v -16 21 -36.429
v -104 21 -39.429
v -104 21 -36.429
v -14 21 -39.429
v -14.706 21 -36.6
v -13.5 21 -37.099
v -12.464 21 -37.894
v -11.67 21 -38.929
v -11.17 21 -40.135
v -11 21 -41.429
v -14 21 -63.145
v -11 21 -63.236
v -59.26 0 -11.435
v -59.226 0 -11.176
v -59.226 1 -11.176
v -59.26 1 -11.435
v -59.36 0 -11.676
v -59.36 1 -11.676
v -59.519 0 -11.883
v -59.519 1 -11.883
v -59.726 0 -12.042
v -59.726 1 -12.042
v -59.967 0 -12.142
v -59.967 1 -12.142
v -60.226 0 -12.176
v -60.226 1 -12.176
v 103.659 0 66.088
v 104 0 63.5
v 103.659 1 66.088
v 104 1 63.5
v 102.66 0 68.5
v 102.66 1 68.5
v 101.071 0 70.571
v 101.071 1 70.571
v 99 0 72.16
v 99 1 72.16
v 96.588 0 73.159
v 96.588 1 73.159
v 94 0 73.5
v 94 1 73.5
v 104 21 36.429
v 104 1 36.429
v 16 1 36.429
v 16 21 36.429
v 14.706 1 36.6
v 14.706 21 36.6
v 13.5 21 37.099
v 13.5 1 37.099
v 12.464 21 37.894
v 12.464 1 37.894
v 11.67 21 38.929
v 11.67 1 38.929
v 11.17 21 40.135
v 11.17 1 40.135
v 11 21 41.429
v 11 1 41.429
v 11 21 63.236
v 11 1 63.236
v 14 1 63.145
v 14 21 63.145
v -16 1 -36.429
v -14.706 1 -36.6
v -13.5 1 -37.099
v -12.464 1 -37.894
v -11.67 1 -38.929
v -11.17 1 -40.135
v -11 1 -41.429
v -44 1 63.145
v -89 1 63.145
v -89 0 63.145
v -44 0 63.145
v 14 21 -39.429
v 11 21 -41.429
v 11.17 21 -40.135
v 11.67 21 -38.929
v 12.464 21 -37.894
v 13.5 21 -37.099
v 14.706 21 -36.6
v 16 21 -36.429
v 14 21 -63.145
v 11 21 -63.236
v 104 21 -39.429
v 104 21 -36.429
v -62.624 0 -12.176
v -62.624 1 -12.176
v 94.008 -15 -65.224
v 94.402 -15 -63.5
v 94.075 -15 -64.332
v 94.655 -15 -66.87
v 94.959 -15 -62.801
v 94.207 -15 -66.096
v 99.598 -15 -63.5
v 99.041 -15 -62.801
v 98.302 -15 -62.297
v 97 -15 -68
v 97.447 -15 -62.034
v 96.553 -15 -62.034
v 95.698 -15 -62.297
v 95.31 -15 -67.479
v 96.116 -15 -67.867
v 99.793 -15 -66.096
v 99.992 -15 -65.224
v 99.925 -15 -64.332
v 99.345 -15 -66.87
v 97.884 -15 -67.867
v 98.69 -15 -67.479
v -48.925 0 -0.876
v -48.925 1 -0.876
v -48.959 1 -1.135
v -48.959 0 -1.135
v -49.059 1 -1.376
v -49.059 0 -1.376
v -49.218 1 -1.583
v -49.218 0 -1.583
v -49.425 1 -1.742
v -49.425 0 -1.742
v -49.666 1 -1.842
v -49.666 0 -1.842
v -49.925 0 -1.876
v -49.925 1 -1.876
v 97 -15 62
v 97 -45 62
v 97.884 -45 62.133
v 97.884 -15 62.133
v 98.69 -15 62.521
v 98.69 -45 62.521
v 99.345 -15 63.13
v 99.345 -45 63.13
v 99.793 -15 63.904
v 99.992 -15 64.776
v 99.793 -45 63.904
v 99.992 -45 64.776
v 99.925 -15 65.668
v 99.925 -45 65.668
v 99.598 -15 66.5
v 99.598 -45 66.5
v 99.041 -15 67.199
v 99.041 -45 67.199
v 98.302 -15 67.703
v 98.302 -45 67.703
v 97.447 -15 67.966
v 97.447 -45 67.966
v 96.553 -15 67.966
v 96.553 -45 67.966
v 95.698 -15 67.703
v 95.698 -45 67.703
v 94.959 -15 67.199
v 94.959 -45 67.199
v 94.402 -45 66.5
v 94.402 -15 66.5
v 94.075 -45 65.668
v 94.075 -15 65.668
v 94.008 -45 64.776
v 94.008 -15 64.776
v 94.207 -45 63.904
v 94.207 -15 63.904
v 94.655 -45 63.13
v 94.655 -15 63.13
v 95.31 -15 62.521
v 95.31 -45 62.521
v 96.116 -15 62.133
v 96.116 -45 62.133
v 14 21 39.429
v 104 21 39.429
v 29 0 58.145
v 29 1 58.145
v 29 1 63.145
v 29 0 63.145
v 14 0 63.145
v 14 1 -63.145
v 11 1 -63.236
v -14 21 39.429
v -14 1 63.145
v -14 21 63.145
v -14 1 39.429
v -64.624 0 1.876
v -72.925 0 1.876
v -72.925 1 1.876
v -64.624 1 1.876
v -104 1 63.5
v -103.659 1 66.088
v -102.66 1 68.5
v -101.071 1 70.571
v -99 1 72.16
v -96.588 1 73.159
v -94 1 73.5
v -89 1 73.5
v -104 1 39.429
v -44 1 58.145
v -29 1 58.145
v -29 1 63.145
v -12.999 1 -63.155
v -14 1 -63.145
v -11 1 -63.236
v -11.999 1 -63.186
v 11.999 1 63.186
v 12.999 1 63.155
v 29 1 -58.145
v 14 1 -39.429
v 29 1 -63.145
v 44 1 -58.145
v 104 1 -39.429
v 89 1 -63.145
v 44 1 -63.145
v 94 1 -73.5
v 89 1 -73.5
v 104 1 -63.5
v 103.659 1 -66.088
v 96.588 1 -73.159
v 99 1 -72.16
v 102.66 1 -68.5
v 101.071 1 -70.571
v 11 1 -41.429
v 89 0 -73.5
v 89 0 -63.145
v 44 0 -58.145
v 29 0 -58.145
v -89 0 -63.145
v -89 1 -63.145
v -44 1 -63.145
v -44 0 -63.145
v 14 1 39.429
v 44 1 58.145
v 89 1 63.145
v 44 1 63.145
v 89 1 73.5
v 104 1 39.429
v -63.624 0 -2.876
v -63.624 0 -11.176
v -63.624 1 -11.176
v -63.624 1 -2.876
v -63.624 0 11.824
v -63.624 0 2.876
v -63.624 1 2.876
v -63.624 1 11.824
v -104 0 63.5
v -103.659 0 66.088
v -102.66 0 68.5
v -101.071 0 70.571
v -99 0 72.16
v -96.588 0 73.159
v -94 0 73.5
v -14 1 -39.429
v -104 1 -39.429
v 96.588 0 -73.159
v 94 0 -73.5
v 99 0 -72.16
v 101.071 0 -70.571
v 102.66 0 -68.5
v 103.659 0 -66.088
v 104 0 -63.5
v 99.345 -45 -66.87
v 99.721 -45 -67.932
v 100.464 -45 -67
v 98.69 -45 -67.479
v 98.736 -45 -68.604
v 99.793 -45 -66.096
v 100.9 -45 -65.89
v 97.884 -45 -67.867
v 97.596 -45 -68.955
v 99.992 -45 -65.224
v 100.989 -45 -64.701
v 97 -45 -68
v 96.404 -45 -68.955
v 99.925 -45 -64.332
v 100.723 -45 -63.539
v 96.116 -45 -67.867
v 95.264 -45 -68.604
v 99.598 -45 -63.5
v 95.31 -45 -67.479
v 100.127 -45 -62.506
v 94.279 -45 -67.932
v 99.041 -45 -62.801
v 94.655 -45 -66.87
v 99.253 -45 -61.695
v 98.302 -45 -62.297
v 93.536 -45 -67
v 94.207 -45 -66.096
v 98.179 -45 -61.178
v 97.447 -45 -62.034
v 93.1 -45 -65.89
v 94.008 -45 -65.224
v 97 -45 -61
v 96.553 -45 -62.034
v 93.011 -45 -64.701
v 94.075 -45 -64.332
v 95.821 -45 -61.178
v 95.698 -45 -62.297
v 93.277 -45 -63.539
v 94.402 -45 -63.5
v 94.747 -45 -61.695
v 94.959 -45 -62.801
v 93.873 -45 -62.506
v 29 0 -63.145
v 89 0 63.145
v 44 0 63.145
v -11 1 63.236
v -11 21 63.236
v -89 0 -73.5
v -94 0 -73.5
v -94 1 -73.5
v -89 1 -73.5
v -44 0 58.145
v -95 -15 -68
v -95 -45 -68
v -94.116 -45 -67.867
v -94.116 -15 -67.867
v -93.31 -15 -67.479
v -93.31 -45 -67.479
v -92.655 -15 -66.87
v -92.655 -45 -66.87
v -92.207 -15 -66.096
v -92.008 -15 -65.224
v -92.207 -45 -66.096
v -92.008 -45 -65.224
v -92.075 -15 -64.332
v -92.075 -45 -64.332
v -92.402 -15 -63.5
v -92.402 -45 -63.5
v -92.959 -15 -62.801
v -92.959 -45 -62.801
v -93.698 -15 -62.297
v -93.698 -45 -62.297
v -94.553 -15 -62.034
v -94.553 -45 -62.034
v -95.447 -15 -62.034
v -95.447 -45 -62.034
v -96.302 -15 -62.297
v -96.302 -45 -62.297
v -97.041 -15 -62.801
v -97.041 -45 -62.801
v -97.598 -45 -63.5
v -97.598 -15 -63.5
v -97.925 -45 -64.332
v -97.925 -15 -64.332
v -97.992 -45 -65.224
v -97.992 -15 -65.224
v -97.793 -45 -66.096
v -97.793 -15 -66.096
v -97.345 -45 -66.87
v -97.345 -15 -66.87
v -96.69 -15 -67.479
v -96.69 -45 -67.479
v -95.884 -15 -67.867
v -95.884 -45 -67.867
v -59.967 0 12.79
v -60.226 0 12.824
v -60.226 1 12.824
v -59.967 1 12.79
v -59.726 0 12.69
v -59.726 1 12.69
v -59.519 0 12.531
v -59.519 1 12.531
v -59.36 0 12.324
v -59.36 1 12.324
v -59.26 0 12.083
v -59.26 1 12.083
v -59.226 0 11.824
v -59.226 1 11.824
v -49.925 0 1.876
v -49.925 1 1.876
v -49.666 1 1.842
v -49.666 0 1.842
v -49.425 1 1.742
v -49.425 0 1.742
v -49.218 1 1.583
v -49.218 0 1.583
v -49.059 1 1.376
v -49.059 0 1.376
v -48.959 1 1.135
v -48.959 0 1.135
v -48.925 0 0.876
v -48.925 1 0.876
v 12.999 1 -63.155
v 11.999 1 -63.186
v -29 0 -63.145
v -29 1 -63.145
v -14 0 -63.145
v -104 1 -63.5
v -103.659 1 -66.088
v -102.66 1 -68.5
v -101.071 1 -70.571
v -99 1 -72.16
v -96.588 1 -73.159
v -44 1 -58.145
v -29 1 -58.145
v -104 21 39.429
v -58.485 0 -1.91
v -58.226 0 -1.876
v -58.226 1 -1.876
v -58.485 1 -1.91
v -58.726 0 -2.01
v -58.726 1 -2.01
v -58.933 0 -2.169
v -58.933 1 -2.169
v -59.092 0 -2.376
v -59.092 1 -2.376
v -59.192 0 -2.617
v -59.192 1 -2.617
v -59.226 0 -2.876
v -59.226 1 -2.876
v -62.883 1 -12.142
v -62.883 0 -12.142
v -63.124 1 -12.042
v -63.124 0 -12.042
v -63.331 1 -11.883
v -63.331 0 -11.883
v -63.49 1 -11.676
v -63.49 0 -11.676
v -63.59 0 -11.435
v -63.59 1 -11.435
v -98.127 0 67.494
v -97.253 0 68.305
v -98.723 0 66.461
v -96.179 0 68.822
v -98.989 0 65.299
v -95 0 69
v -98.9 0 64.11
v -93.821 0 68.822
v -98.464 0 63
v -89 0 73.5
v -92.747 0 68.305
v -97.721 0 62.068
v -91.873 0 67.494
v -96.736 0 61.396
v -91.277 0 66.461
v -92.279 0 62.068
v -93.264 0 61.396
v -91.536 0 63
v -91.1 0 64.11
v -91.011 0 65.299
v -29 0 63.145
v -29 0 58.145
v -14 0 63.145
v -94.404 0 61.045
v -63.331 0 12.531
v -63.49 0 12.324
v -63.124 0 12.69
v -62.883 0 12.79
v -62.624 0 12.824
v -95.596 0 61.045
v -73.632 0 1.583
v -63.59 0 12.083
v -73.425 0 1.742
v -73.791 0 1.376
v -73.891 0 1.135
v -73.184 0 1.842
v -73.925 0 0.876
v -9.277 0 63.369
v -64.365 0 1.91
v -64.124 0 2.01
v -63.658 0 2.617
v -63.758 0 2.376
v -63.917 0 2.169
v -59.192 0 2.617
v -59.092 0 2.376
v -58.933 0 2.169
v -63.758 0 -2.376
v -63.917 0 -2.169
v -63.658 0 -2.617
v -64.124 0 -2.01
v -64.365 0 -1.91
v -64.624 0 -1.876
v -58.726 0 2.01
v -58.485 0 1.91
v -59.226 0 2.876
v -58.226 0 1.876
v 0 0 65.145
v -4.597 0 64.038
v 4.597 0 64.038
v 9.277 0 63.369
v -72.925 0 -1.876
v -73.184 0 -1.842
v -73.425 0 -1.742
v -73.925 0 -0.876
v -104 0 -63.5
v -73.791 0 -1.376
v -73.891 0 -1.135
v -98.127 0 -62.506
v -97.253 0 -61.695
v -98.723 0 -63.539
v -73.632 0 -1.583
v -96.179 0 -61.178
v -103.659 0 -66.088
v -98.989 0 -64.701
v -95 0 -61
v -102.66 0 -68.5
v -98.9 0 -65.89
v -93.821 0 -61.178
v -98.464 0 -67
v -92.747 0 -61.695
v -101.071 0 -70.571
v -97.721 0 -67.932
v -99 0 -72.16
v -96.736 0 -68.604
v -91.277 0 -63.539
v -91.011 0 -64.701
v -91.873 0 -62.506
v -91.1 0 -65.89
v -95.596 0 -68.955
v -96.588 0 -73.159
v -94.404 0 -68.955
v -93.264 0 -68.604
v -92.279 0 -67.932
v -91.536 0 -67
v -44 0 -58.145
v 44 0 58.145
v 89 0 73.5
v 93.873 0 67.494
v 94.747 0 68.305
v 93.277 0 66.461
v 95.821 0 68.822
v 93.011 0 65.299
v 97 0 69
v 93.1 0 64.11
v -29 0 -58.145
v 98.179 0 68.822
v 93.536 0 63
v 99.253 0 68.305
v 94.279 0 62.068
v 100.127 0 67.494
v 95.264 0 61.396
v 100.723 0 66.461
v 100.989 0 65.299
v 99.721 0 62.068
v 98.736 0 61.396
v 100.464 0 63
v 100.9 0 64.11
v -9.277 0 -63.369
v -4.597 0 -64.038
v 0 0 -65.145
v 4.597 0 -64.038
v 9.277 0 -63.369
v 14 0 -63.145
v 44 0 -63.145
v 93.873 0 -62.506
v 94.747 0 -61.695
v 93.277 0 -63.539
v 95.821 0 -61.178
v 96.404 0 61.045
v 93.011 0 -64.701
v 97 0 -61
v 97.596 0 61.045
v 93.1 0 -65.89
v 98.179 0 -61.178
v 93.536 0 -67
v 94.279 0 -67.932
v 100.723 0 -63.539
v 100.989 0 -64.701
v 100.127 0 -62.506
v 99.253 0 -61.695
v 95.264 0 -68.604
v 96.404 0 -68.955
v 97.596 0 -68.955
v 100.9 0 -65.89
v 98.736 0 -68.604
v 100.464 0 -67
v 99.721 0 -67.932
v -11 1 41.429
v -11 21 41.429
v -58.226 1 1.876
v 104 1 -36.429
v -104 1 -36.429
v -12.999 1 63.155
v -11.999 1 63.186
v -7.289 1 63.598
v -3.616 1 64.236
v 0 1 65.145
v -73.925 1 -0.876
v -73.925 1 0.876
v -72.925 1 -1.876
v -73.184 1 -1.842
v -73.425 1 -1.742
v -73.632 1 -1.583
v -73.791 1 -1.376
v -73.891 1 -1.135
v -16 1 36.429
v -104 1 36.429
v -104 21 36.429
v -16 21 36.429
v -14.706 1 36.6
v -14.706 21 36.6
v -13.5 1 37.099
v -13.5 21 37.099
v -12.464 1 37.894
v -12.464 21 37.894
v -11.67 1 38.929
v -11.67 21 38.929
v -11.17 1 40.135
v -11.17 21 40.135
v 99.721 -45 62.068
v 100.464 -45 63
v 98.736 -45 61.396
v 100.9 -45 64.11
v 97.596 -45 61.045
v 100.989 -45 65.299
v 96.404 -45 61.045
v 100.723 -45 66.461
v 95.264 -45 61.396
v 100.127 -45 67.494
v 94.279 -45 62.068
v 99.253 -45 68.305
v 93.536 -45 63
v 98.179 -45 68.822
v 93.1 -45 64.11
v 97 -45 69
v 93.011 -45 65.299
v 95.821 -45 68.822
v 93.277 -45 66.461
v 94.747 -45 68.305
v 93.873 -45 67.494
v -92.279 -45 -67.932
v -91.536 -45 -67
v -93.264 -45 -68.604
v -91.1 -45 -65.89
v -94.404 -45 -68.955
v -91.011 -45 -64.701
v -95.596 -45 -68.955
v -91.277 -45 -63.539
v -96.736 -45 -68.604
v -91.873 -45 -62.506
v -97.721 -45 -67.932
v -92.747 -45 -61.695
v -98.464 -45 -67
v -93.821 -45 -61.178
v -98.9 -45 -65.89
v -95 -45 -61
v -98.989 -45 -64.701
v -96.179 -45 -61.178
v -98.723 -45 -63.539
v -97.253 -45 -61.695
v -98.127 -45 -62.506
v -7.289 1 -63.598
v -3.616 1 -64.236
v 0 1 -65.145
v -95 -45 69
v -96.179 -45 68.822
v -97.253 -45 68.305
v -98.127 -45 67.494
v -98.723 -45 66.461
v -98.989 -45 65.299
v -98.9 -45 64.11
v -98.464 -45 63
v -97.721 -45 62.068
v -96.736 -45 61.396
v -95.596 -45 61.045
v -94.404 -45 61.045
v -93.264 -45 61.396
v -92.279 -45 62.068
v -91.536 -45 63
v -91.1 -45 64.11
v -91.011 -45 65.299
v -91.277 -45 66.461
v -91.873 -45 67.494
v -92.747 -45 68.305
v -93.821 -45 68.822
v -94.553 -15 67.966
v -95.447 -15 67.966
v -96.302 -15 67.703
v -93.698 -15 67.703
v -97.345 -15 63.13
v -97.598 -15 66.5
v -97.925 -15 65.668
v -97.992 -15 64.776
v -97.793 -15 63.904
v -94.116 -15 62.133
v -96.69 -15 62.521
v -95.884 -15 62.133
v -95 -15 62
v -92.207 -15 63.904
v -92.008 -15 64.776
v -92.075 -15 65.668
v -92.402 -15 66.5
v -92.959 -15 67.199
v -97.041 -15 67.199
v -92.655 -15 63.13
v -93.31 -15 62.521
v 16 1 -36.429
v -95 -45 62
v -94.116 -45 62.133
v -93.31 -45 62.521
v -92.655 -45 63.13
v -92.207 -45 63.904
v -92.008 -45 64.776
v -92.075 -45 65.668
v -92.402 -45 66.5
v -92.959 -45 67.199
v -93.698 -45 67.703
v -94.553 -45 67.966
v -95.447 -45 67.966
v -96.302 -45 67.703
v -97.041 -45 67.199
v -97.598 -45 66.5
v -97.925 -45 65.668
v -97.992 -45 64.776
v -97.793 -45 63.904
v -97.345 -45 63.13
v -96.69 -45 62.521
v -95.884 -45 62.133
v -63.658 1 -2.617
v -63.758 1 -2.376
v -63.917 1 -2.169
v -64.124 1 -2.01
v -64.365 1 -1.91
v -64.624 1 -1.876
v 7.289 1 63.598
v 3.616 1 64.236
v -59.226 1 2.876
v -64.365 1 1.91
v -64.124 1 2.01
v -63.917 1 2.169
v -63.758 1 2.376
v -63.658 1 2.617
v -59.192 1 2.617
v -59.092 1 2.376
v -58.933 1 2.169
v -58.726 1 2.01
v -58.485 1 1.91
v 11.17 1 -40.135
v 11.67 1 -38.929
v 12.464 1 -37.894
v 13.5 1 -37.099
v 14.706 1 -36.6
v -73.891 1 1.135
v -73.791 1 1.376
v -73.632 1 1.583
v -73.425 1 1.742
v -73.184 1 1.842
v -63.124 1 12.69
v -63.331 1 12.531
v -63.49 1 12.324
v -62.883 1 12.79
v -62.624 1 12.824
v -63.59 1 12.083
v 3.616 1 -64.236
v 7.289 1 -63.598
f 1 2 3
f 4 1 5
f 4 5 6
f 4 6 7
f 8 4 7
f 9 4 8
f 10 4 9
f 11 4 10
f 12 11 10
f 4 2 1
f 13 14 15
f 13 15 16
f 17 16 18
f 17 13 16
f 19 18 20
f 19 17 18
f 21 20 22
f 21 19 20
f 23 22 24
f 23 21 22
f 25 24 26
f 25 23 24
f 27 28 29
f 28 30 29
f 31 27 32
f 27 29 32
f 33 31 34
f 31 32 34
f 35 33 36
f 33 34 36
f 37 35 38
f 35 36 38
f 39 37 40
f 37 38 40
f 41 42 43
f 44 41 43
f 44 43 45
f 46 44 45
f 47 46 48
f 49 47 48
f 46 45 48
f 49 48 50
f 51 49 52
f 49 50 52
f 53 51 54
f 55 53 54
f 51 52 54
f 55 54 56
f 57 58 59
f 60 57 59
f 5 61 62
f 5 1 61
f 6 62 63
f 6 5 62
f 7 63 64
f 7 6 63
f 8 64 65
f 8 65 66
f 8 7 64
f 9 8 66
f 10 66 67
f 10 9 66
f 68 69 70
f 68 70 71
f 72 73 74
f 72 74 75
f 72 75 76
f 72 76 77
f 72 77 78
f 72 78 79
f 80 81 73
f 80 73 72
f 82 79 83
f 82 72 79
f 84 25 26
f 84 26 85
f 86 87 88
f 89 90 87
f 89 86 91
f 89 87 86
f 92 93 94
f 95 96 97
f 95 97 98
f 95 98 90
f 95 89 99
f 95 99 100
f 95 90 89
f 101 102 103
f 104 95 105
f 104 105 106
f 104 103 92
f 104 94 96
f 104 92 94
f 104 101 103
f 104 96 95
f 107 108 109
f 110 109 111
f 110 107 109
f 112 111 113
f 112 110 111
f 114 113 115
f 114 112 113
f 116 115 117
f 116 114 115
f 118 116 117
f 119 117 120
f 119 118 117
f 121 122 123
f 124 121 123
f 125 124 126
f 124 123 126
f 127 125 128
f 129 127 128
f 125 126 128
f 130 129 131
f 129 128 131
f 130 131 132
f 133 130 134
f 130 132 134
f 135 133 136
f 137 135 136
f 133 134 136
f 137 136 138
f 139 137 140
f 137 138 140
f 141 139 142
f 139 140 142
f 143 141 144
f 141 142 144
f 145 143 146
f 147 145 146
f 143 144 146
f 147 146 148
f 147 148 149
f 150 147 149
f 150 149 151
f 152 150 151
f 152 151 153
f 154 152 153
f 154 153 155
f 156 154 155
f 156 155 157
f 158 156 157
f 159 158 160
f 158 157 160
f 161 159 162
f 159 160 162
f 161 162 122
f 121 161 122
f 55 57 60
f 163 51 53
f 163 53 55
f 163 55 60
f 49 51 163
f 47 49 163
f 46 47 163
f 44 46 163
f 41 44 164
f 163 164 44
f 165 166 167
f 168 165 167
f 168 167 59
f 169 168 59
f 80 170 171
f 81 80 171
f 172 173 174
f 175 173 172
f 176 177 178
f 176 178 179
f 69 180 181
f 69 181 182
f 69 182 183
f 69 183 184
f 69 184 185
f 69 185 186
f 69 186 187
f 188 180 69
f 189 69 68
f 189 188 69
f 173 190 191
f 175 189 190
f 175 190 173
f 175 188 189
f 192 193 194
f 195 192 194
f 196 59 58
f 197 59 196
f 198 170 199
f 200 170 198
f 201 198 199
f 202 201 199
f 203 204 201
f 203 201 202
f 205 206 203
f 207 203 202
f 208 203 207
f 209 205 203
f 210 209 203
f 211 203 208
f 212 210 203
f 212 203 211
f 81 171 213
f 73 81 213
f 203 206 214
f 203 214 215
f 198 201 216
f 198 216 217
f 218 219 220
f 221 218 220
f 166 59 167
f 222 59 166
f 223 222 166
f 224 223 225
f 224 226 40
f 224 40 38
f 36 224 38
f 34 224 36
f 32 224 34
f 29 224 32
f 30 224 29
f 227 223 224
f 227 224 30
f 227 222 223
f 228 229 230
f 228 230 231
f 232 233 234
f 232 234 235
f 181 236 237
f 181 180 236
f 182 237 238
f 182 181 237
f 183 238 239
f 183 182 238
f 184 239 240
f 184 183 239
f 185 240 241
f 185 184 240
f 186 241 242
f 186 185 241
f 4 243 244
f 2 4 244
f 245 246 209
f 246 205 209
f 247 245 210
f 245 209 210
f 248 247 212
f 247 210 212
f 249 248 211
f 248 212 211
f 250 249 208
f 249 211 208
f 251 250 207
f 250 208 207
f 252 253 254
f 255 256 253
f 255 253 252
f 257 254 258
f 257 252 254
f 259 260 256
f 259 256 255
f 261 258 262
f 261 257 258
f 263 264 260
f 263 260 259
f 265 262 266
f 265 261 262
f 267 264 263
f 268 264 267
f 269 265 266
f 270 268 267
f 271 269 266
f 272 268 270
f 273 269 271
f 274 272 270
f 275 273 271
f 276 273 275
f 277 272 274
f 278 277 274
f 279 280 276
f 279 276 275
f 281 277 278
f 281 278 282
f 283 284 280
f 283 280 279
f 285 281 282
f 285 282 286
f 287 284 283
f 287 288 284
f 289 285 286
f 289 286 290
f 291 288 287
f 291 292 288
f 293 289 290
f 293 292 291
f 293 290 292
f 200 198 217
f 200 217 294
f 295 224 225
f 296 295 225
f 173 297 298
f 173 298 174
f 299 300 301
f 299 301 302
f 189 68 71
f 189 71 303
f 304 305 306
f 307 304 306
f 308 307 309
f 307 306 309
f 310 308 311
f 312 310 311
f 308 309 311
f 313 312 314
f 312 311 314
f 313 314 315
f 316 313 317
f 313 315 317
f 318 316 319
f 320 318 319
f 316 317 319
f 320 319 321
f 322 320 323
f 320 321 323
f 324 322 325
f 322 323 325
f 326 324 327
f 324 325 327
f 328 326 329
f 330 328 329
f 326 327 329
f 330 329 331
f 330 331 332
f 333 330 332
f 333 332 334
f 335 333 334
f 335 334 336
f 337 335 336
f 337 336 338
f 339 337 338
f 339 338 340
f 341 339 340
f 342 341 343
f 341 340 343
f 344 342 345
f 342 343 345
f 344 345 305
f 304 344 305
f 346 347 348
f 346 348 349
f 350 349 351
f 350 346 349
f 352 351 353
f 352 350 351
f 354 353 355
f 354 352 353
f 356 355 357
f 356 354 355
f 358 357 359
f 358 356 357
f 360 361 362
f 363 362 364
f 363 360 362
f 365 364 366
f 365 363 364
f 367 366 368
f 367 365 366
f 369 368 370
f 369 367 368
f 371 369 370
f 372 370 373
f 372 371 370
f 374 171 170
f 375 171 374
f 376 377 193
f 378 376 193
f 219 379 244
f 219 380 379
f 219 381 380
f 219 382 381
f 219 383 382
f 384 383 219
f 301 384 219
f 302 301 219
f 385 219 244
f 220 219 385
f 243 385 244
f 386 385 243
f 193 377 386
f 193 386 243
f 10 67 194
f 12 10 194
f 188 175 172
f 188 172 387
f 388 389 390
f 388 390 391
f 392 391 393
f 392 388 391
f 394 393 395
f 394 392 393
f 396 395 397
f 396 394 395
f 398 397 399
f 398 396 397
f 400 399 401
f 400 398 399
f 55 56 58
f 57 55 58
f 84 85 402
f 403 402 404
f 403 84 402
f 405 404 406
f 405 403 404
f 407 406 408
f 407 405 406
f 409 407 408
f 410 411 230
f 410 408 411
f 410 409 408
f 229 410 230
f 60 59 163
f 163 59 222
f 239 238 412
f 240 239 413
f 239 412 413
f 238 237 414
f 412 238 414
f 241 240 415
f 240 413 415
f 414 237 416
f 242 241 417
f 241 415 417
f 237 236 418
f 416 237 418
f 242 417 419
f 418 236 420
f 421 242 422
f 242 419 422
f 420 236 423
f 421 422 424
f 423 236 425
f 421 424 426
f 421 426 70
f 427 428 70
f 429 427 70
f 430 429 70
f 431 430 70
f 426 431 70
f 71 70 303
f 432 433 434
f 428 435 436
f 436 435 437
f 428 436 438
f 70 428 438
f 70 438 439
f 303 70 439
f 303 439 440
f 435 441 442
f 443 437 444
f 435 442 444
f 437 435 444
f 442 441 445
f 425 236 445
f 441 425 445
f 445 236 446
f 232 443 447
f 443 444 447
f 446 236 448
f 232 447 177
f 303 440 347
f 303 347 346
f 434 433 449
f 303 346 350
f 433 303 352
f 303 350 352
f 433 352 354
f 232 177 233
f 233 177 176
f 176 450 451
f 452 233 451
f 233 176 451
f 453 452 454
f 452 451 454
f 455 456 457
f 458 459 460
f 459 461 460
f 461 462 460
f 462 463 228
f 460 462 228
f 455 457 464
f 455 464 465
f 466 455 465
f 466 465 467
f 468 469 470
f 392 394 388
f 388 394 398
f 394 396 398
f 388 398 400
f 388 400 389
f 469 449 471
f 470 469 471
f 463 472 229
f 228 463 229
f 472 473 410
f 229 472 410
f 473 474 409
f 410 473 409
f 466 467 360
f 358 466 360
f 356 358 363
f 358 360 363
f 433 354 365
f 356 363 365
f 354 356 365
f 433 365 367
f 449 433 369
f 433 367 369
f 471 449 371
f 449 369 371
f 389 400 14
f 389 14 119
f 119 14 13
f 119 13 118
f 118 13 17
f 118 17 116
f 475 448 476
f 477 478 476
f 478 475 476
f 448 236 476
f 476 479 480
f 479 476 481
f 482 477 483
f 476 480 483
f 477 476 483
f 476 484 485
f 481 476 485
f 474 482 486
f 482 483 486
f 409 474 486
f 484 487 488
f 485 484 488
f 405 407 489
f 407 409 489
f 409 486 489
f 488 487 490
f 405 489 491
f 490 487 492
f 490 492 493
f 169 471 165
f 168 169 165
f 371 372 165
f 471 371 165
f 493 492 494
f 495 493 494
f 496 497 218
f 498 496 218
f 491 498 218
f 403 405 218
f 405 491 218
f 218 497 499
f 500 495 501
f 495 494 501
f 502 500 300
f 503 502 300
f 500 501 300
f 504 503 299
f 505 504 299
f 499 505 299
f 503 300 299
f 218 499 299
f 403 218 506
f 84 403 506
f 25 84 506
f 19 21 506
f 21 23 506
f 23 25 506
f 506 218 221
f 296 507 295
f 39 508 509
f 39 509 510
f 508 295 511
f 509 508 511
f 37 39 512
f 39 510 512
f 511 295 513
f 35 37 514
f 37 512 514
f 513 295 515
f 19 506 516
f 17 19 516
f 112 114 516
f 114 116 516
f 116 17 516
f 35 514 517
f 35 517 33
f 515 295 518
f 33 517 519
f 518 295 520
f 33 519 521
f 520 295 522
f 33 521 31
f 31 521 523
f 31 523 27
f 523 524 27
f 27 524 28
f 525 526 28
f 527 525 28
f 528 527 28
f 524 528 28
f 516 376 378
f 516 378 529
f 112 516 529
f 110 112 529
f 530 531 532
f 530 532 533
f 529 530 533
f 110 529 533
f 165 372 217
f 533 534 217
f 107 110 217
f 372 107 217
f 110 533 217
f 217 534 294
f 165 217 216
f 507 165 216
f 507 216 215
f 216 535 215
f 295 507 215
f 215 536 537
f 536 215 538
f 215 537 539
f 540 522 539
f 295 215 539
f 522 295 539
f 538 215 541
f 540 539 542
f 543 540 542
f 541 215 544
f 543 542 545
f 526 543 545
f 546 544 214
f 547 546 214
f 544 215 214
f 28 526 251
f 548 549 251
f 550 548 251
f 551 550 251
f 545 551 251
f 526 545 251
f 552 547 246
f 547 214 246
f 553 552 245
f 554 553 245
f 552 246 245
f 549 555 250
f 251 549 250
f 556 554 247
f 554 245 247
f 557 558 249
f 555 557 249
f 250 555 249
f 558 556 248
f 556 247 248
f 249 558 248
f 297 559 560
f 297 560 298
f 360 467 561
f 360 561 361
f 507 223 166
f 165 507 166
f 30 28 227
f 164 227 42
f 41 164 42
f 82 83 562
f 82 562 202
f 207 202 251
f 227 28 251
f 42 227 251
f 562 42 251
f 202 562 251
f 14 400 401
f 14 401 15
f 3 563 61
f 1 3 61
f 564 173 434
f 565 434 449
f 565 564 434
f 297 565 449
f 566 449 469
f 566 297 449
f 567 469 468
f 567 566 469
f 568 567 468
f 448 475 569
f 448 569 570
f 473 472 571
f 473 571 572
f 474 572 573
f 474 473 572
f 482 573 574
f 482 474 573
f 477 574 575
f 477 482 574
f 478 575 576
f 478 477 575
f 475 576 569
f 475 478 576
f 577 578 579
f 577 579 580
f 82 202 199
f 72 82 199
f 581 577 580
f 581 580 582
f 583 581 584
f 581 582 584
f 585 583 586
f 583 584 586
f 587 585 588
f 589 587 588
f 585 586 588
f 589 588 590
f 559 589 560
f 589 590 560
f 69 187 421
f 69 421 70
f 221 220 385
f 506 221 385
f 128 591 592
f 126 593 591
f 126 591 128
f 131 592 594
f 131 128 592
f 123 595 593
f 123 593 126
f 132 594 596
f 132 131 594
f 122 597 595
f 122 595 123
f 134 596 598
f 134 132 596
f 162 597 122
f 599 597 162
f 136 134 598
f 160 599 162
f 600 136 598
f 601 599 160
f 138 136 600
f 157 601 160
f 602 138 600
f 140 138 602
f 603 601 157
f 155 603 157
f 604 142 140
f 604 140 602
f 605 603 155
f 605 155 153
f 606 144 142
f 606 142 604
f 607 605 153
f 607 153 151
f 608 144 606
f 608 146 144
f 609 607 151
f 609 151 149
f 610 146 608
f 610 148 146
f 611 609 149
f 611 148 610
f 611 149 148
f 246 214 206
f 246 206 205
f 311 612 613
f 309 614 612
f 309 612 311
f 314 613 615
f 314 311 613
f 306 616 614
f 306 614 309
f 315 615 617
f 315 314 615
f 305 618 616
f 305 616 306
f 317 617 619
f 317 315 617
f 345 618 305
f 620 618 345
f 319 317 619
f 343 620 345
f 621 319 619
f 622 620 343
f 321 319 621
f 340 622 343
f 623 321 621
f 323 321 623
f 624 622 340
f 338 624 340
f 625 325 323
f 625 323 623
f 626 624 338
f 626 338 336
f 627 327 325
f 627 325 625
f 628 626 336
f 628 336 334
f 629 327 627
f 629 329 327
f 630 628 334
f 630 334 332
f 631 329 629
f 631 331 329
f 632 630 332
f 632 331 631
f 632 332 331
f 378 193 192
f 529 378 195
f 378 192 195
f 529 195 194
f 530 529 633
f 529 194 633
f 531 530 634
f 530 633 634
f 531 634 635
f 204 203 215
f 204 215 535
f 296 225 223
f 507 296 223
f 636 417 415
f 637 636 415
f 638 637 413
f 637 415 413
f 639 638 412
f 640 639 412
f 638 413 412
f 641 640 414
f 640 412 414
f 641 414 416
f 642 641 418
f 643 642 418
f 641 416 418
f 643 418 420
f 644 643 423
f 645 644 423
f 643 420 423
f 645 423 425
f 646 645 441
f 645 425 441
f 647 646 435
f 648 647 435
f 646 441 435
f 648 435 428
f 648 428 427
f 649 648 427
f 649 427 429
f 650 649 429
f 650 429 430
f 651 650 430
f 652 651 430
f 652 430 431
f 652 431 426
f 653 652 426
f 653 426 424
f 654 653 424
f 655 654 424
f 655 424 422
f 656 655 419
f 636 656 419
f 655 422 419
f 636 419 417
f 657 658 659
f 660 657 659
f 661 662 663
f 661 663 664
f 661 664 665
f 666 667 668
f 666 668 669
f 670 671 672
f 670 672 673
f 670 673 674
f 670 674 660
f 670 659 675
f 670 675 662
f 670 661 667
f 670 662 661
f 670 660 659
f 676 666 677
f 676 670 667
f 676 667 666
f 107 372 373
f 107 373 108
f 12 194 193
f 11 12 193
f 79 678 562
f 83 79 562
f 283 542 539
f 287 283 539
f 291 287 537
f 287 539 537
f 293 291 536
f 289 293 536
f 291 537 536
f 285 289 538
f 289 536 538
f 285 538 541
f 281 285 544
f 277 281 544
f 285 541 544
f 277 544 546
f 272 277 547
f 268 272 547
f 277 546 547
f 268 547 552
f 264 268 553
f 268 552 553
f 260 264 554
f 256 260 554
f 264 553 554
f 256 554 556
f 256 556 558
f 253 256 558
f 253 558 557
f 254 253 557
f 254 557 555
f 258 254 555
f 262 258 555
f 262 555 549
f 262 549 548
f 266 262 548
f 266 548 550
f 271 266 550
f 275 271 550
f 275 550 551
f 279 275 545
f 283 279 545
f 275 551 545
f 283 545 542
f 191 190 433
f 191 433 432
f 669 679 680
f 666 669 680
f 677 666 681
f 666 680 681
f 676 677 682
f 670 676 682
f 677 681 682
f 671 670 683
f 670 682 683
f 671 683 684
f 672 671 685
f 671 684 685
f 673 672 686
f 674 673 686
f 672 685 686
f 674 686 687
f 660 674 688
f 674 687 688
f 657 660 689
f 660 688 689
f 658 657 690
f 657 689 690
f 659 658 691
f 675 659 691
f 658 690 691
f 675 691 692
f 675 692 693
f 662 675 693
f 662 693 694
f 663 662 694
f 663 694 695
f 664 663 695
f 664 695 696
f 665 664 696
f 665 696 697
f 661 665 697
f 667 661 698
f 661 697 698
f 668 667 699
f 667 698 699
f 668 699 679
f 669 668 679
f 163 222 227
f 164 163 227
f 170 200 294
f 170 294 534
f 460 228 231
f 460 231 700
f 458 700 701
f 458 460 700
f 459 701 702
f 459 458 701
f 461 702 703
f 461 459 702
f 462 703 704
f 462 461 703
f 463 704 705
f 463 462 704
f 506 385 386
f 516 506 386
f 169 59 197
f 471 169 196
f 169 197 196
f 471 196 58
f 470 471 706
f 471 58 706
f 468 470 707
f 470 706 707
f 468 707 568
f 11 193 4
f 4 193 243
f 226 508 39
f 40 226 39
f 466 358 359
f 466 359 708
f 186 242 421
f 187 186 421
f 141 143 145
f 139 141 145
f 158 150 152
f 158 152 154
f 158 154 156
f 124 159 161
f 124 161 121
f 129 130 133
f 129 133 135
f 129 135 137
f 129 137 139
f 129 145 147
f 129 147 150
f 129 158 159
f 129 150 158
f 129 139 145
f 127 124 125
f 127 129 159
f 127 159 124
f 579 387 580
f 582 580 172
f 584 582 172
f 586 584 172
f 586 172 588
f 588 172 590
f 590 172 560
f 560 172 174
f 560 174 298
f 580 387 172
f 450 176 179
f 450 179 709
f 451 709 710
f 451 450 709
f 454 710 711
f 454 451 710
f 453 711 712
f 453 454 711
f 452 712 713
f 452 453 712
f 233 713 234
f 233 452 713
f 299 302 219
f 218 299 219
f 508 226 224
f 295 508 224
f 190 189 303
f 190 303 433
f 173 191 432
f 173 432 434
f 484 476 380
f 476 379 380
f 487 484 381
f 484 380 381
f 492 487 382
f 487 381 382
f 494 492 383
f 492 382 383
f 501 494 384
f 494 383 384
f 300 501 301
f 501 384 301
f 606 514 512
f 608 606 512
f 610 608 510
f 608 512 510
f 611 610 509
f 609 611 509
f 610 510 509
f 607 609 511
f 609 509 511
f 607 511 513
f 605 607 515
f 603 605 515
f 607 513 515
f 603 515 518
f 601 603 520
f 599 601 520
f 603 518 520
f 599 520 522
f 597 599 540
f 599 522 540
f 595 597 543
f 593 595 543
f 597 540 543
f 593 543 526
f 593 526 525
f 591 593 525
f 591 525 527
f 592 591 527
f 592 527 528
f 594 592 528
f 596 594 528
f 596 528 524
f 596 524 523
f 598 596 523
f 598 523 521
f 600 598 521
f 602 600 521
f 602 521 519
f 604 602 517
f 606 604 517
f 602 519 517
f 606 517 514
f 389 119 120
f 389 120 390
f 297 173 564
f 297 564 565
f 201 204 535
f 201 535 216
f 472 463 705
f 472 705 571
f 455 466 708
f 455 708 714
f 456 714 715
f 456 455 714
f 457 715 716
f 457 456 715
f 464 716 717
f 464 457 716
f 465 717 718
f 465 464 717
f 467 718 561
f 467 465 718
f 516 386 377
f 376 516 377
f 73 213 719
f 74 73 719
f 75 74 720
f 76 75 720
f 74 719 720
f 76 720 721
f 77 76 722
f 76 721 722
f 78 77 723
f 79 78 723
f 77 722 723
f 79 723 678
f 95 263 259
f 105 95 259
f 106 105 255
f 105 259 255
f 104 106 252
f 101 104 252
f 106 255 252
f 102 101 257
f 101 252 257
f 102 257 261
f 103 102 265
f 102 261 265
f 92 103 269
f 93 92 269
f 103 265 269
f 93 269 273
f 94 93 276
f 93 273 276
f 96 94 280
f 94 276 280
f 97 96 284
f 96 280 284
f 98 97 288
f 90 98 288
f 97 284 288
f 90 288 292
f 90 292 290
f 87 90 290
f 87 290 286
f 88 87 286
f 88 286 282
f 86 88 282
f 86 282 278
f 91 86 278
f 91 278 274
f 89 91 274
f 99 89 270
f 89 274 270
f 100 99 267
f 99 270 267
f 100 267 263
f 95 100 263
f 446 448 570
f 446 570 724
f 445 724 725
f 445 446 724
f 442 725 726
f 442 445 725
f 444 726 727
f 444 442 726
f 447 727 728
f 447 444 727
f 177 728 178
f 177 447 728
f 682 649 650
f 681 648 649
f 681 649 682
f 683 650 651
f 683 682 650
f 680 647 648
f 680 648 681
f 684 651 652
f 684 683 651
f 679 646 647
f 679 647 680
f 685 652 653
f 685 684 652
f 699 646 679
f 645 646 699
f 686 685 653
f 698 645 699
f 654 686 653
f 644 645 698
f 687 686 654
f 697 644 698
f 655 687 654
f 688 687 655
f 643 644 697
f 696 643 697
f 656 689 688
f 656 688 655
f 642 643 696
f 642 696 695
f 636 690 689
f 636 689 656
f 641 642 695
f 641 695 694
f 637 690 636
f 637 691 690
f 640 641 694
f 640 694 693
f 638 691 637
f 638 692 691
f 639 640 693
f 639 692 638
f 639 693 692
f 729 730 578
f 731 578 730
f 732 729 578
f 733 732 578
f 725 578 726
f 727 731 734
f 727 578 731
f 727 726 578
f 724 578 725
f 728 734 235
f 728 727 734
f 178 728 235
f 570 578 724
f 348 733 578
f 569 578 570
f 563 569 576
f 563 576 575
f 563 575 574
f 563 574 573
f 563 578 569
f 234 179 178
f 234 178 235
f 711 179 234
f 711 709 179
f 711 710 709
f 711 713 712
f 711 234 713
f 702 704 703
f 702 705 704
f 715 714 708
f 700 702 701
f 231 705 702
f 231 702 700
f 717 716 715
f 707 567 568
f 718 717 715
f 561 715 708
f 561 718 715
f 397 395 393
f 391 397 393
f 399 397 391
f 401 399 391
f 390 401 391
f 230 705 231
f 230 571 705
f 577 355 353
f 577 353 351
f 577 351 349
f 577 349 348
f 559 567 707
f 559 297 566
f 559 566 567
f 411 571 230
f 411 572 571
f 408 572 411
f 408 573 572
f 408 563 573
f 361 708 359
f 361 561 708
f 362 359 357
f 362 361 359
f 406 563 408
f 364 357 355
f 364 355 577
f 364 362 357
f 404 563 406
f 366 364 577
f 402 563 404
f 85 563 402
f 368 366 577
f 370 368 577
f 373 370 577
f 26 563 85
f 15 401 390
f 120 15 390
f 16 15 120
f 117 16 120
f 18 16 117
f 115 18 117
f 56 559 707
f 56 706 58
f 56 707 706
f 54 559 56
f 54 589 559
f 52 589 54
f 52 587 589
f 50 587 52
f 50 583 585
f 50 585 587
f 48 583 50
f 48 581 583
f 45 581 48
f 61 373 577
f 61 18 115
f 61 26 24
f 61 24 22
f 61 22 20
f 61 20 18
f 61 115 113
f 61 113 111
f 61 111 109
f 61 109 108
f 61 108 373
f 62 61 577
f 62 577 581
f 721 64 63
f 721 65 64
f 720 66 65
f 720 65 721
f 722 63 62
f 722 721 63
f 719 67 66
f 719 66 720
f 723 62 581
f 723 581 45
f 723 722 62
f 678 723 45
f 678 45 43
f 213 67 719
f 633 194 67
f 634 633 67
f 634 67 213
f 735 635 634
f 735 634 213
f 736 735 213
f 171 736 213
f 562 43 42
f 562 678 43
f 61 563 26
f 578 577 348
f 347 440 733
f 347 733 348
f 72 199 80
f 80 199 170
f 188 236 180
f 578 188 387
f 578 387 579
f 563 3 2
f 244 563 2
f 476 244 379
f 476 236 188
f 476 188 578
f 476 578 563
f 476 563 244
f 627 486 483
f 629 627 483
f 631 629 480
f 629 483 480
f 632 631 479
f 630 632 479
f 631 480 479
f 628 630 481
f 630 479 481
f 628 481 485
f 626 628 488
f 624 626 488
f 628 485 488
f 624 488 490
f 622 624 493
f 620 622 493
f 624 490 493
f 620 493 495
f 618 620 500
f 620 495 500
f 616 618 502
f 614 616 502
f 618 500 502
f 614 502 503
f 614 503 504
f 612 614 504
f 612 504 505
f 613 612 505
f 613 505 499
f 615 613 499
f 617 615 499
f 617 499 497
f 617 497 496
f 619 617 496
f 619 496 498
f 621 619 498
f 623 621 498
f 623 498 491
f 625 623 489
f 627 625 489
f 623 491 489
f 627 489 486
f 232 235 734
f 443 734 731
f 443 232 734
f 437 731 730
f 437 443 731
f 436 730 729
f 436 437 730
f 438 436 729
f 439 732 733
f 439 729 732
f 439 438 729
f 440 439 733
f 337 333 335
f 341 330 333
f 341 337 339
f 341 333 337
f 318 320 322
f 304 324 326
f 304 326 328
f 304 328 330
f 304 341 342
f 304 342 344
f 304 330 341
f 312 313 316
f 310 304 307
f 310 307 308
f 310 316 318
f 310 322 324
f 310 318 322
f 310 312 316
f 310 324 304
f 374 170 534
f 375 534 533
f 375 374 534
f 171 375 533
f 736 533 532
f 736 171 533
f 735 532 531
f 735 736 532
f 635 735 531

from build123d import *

# Parameters (mm, degrees)
SKETCH1_W            = 208
SKETCH1_H            = 147
BOSS_EXTRUDE1_DEPTH  = 1
CUT_EXTRUDE1_DEPTH   = 128.354819304
MIRROR2_COPY_1_DEPTH = 128.354819304
FILLET1_R            = 10
CUT_EXTRUDE2_DEPTH   = 128.354819304
BOSS_EXTRUDE2_DEPTH  = 20
FILLET2_R            = 5
FILLET2_OF_MIRROR3_R = 5
MIRROR4_START        = 1
MIRROR4_DEPTH        = 20
SKETCH7_R            = 4
BOSS_EXTRUDE3_DEPTH  = 45
SKETCH8_R            = 3
CUT_EXTRUDE4_DEPTH   = 30


# Read off the part's stored shape, not the designer's step: Mirror4
with BuildPart() as part:
    # Sketch1 → Boss-Extrude1 (new body)
    with BuildSketch(Plane(origin=(0, 0, 0), x_dir=(1, 0, 0), z_dir=(0, 1, 0))):
        Rectangle(SKETCH1_W, SKETCH1_H)
    extrude(amount=BOSS_EXTRUDE1_DEPTH)

    # Sketch3 → Cut-Extrude1 (cut, through all)
    with BuildSketch(Plane(origin=(0, 1, 0), x_dir=(1, 0, 0), z_dir=(0, 1, 0))):
        with BuildLine():
            Line((-89, 83.145473262), (-89, 63.145473262))
            Line((-89, 63.145473262), (-44, 63.145473262))
            Line((-44, 63.145473262), (-44, 58.145473262))
            Line((-44, 58.145473262), (-29, 58.145473262))
            Line((-29, 58.145473262), (-29, 63.145473262))
            Line((-29, 63.145473262), (-14, 63.145473262))
            ThreePointArc((-14, 63.145473262), (-6.928932188, 63.647998579), (0, 65.145473262))
            Line((0, 65.145473262), (0, 85.145473262))
            Line((0, 85.145473262), (-89, 85.145473262))
            Line((-89, 85.145473262), (-89, 83.145473262))
        make_face()
    cut_extrude1 = extrude(amount=-CUT_EXTRUDE1_DEPTH, mode=Mode.SUBTRACT)

    # Mirror1: Cut-Extrude1 across plane
    add(cut_extrude1.mirror(Plane.XY), mode=Mode.SUBTRACT)

    # Mirror2: Cut-Extrude1 across plane
    add(cut_extrude1.mirror(Plane(origin=(0, 0, 0), x_dir=(0, 0, 1), z_dir=(1, 0, 0))), mode=Mode.SUBTRACT)

    # Mirror2 copy 1 sketch → Mirror2 copy 1 (cut, through all)
    with BuildSketch(Plane(origin=(0, 1, 0), x_dir=(-1, 0, 0), z_dir=(0, 1, 0))):
        with BuildLine():
            Line((-89, 83.145473262), (-89, 63.145473262))
            Line((-89, 63.145473262), (-44, 63.145473262))
            Line((-44, 63.145473262), (-44, 58.145473262))
            Line((-44, 58.145473262), (-29, 58.145473262))
            Line((-29, 58.145473262), (-29, 63.145473262))
            Line((-29, 63.145473262), (-14, 63.145473262))
            ThreePointArc((-14, 63.145473262), (-6.928932188, 63.647998579), (0, 65.145473262))
            Line((0, 65.145473262), (0, 85.145473262))
            Line((0, 85.145473262), (-89, 85.145473262))
            Line((-89, 85.145473262), (-89, 83.145473262))
        make_face()
    extrude(amount=-MIRROR2_COPY_1_DEPTH, mode=Mode.SUBTRACT)

    # Fillet1
    fillet1_edges = [part.edges().sort_by_distance(p)[0] for p in [
        (104, 0.5, 73.5),
        (-104, 0.5, 73.5),
        (-104, 0.5, -73.5),
        (104, 0.5, -73.5),
    ]]
    fillet(fillet1_edges, radius=FILLET1_R)

    # Sketch4 → Cut-Extrude2 (cut, through all)
    with BuildSketch(Plane.XZ):
        with BuildLine():
            Line((-58.225796132, 1.876244538), (-49.924870206, 1.876244538))
            ThreePointArc((-49.924870206, 1.876244538), (-49.217763425, 1.583351319), (-48.924870206, 0.876244538))
            Line((-48.924870206, 0.876244538), (-48.924870206, -0.876244538))
            ThreePointArc((-48.924870206, -0.876244538), (-49.217763425, -1.583351319), (-49.924870206, -1.876244538))
            Line((-49.924870206, -1.876244538), (-58.225796132, -1.876244538))
            ThreePointArc((-58.225796132, -1.876244538), (-58.932902913, -2.169137757), (-59.225796132, -2.876244538))
            Line((-59.225796132, -2.876244538), (-59.225796132, -11.176244538))
            ThreePointArc((-59.225796132, -11.176244538), (-59.518689351, -11.883351319), (-60.225796132, -12.176244538))
            Line((-60.225796132, -12.176244538), (-62.62394428, -12.176244538))
            ThreePointArc((-62.62394428, -12.176244538), (-63.331051061, -11.883351319), (-63.62394428, -11.176244538))
            Line((-63.62394428, -11.176244538), (-63.62394428, -2.876244538))
            ThreePointArc((-63.62394428, -2.876244538), (-63.916837499, -2.169137757), (-64.62394428, -1.876244538))
            Line((-64.62394428, -1.876244538), (-72.924870206, -1.876244538))
            ThreePointArc((-72.924870206, -1.876244538), (-73.631976987, -1.583351319), (-73.924870206, -0.876244538))
            Line((-73.924870206, -0.876244538), (-73.924870206, 0.876244538))
            ThreePointArc((-73.924870206, 0.876244538), (-73.631976987, 1.583351319), (-72.924870206, 1.876244538))
            Line((-72.924870206, 1.876244538), (-64.62394428, 1.876244538))
            ThreePointArc((-64.62394428, 1.876244538), (-63.916837499, 2.169137757), (-63.62394428, 2.876244538))
            Line((-63.62394428, 2.876244538), (-63.62394428, 11.823755462))
            ThreePointArc((-63.62394428, 11.823755462), (-63.331051061, 12.530862243), (-62.62394428, 12.823755462))
            Line((-62.62394428, 12.823755462), (-60.225796132, 12.823755462))
            ThreePointArc((-60.225796132, 12.823755462), (-59.518689351, 12.530862243), (-59.225796132, 11.823755462))
            Line((-59.225796132, 11.823755462), (-59.225796132, 2.876244538))
            ThreePointArc((-59.225796132, 2.876244538), (-58.932902913, 2.169137757), (-58.225796132, 1.876244538))
        make_face()
    extrude(amount=-CUT_EXTRUDE2_DEPTH, mode=Mode.SUBTRACT)

    # Sketch5 → Boss-Extrude2 (add)
    with BuildSketch(Plane(origin=(0, 1, 0), x_dir=(1, 0, 0), z_dir=(0, 1, 0))):
        Polygon((-104, 36.429300806), (-11, 36.429300806), (-11, 63.235554408), (-14, 63.145473262), (-14, 39.429300806), (-104, 39.429300806), align=None)
    boss_extrude2 = extrude(amount=BOSS_EXTRUDE2_DEPTH)

    # Fillet2
    fillet2_edges = [part.edges().sort_by_distance(p)[0] for p in [
        (-11, 11, -36.429300806),
    ]]
    fillet(fillet2_edges, radius=FILLET2_R)

    # Mirror3: Boss-Extrude2 across plane
    add(boss_extrude2.mirror(Plane.XY))

    # Fillet2 of Mirror3
    fillet2_of_mirror3_edges = [part.edges().sort_by_distance(p)[0] for p in [
        (-11, 11, 36.429300806),
    ]]
    fillet(fillet2_of_mirror3_edges, radius=FILLET2_OF_MIRROR3_R)

    # Mirror4 outline → Mirror4 (add)
    with BuildSketch(Plane(origin=(0, 0, 0), x_dir=(1, 0, 0), z_dir=(0, 1, 0)).offset(MIRROR4_START)):
        with BuildLine():
            Line((104, -39.429300806), (104, -36.429300806))
            Line((104, -36.429300806), (16, -36.429300806))
            ThreePointArc((16, -36.429300806), (12.464466094, -37.8937669), (11, -41.429300806))
            Line((11, -41.429300806), (11, -63.235554408))
            Line((11, -63.235554408), (14, -63.145473262))
            Line((14, -63.145473262), (14, -39.429300806))
            Line((14, -39.429300806), (104, -39.429300806))
        make_face()
        with BuildLine():
            Line((104, 36.429300806), (104, 39.429300806))
            Line((104, 39.429300806), (14, 39.429300806))
            Line((14, 39.429300806), (14, 63.145473262))
            Line((14, 63.145473262), (11, 63.235554408))
            Line((11, 63.235554408), (11, 41.429300806))
            ThreePointArc((11, 41.429300806), (12.464466094, 37.8937669), (16, 36.429300806))
            Line((16, 36.429300806), (104, 36.429300806))
        make_face()
    extrude(amount=MIRROR4_DEPTH)

    # Sketch7 → Boss-Extrude3 (add)
    with BuildSketch(Plane.XZ):
        with Locations(Location((97, 65, 0), (0, 0, 90))):
            Circle(SKETCH7_R)
        with Locations(Location((-95, 65, 0), (0, 0, 90))):
            Circle(SKETCH7_R)
        with Locations(Location((-95, -65, 0), (0, 0, 90))):
            Circle(SKETCH7_R)
        with Locations(Location((97, -65, 0), (0, 0, 90))):
            Circle(SKETCH7_R)
    extrude(amount=BOSS_EXTRUDE3_DEPTH)

    # Sketch8 → Cut-Extrude4 (cut)
    with BuildSketch(Plane(origin=(0, -45, 0), x_dir=(-1, 0, 0), z_dir=(0, -1, 0))):
        with Locations(Location((95, 65, 0), (0, 0, 90))):
            Circle(SKETCH8_R)
        with Locations(Location((95, -65, 0), (0, 0, 90))):
            Circle(SKETCH8_R)
        with Locations(Location((-97, -65, 0), (0, 0, 90))):
            Circle(SKETCH8_R)
        with Locations(Location((-97, 65, 0), (0, 0, 90))):
            Circle(SKETCH8_R)
    extrude(amount=-CUT_EXTRUDE4_DEPTH, mode=Mode.SUBTRACT)


solid = part.part
